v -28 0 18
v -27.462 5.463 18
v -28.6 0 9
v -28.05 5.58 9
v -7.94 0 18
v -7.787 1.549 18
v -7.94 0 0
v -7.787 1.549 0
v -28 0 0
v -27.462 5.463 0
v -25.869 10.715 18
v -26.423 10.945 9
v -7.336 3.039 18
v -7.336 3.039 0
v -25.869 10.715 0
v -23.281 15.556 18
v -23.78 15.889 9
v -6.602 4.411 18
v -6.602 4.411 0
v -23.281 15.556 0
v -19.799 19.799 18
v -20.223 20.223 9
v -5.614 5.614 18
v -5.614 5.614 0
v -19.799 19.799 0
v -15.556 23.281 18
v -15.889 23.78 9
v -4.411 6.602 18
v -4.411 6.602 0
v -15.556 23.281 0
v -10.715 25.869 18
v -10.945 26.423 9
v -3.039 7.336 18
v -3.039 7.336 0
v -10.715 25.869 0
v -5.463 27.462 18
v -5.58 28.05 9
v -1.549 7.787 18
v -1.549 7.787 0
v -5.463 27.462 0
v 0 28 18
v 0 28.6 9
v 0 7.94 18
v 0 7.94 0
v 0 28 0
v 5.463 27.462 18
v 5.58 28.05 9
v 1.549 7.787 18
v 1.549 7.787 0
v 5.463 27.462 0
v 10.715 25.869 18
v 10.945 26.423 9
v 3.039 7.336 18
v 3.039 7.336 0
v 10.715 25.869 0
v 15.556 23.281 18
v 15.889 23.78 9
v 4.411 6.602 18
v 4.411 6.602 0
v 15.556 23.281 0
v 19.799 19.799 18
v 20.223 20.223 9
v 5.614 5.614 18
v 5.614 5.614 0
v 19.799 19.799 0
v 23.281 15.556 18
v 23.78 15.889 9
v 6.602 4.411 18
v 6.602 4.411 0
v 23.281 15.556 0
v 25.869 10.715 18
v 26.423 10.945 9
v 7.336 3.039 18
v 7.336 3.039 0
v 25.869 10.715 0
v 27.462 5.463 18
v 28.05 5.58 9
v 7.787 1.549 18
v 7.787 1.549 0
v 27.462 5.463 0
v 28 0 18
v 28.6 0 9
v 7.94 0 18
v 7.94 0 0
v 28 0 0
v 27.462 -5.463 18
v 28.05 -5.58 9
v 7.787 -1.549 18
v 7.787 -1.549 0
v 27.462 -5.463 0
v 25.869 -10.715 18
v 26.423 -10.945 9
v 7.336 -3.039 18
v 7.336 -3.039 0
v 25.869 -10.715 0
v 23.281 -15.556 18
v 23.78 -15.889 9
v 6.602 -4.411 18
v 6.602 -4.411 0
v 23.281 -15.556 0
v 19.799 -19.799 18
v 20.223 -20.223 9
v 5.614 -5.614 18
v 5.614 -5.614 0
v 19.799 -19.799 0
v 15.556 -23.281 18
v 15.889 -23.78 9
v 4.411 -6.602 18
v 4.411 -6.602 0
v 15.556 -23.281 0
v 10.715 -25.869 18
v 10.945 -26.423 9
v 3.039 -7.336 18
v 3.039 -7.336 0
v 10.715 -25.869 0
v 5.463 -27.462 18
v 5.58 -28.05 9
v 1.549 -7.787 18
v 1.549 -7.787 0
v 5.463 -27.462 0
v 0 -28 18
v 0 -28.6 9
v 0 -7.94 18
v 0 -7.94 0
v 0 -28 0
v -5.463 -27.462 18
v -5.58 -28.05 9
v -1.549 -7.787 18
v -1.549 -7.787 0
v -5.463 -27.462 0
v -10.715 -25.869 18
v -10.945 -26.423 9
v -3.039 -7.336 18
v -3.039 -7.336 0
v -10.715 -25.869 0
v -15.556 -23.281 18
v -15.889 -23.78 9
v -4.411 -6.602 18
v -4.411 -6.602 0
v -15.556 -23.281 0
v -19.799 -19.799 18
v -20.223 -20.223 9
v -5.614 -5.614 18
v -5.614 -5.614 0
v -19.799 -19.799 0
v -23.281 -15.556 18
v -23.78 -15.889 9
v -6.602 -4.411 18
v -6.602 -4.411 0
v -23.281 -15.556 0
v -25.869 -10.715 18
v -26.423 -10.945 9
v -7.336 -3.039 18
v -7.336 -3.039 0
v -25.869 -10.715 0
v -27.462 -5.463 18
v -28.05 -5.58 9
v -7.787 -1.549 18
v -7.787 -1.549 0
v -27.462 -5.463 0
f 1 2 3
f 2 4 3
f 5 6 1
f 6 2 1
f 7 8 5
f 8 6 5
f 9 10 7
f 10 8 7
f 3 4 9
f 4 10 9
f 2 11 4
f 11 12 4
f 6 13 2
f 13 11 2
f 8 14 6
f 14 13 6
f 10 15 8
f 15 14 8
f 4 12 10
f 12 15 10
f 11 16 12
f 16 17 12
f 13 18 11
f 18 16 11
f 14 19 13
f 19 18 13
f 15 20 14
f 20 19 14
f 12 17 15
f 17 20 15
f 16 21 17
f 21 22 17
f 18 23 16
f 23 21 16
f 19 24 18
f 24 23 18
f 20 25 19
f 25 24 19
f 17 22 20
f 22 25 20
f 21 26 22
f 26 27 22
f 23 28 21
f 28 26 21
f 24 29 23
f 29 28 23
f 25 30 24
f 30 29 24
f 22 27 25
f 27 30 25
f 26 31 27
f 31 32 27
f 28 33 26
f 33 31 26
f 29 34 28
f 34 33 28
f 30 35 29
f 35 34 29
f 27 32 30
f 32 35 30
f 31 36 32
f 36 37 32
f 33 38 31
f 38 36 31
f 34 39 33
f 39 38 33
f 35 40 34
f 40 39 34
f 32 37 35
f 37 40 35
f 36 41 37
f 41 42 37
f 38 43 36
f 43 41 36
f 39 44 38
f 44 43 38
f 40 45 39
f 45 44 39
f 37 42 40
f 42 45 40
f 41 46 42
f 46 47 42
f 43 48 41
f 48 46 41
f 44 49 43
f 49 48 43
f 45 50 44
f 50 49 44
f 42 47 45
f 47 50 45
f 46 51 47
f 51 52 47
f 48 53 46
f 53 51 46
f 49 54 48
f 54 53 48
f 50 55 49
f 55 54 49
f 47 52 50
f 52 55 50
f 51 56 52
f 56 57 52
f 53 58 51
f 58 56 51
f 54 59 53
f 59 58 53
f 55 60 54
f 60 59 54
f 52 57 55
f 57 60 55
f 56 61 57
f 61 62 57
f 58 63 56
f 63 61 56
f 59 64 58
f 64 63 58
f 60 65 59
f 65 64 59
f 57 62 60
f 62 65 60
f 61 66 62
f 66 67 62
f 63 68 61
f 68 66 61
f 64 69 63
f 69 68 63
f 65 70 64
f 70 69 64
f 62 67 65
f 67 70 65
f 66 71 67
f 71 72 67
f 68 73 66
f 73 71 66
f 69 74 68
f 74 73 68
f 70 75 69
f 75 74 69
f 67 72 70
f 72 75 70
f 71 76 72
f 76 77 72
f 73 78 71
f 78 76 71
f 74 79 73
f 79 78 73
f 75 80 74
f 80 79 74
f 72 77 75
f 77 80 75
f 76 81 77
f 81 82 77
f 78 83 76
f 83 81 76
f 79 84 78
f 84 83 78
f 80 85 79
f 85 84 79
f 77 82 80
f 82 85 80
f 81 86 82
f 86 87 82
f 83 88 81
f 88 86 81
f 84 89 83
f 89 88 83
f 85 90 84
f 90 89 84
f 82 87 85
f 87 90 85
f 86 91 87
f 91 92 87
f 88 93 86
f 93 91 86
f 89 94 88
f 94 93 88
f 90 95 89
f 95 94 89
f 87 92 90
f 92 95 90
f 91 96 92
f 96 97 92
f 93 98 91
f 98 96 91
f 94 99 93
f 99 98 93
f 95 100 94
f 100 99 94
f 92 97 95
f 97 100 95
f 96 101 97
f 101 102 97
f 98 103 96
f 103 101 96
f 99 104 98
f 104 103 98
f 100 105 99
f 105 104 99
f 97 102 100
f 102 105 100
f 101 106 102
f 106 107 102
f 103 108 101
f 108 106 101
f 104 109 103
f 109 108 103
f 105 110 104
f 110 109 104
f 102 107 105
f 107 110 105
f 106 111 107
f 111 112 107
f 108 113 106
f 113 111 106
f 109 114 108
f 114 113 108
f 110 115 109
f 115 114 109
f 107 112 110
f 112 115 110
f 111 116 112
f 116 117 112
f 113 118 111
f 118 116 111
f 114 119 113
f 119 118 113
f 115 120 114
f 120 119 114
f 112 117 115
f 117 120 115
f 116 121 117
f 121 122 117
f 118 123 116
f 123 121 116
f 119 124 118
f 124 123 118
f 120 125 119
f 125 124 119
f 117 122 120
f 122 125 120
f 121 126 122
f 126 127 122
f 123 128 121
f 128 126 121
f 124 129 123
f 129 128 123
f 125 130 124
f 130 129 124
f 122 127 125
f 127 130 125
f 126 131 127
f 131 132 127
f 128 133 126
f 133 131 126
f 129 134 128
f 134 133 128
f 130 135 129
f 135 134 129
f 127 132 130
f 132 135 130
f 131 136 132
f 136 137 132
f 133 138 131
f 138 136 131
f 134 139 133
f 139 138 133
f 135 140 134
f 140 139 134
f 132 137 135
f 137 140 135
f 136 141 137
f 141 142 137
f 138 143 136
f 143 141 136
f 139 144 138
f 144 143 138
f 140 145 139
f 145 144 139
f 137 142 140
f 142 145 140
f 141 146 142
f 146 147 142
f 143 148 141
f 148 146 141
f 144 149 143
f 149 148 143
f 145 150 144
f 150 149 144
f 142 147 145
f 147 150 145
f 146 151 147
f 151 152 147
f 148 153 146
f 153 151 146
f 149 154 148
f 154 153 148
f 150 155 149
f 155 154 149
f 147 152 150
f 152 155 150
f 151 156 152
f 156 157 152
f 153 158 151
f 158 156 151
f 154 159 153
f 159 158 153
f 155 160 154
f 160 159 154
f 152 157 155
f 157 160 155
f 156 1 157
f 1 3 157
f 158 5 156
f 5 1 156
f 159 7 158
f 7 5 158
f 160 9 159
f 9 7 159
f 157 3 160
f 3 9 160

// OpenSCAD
$fn = 32;

// ----------------------------------------------------------------------
// Belt roller: 56 mm barrel, 18 mm wide, bore 15.88 mm
// ----------------------------------------------------------------------

// --- parameters (mm) ---
bore_d = 15.88;           // bore
barrel_d = 56;            // barrel diameter
roller_w = 18;            // roller width
crown = 0.6;              // crown height at mid width

roller_profile = [[7.94, 0], [28, 0], [28.6, 9], [28, 18], [7.94, 18]];

/* the profile stays clear of the axis, so the bore comes out of the revolve */
rotate_extrude() polygon(roller_profile);
